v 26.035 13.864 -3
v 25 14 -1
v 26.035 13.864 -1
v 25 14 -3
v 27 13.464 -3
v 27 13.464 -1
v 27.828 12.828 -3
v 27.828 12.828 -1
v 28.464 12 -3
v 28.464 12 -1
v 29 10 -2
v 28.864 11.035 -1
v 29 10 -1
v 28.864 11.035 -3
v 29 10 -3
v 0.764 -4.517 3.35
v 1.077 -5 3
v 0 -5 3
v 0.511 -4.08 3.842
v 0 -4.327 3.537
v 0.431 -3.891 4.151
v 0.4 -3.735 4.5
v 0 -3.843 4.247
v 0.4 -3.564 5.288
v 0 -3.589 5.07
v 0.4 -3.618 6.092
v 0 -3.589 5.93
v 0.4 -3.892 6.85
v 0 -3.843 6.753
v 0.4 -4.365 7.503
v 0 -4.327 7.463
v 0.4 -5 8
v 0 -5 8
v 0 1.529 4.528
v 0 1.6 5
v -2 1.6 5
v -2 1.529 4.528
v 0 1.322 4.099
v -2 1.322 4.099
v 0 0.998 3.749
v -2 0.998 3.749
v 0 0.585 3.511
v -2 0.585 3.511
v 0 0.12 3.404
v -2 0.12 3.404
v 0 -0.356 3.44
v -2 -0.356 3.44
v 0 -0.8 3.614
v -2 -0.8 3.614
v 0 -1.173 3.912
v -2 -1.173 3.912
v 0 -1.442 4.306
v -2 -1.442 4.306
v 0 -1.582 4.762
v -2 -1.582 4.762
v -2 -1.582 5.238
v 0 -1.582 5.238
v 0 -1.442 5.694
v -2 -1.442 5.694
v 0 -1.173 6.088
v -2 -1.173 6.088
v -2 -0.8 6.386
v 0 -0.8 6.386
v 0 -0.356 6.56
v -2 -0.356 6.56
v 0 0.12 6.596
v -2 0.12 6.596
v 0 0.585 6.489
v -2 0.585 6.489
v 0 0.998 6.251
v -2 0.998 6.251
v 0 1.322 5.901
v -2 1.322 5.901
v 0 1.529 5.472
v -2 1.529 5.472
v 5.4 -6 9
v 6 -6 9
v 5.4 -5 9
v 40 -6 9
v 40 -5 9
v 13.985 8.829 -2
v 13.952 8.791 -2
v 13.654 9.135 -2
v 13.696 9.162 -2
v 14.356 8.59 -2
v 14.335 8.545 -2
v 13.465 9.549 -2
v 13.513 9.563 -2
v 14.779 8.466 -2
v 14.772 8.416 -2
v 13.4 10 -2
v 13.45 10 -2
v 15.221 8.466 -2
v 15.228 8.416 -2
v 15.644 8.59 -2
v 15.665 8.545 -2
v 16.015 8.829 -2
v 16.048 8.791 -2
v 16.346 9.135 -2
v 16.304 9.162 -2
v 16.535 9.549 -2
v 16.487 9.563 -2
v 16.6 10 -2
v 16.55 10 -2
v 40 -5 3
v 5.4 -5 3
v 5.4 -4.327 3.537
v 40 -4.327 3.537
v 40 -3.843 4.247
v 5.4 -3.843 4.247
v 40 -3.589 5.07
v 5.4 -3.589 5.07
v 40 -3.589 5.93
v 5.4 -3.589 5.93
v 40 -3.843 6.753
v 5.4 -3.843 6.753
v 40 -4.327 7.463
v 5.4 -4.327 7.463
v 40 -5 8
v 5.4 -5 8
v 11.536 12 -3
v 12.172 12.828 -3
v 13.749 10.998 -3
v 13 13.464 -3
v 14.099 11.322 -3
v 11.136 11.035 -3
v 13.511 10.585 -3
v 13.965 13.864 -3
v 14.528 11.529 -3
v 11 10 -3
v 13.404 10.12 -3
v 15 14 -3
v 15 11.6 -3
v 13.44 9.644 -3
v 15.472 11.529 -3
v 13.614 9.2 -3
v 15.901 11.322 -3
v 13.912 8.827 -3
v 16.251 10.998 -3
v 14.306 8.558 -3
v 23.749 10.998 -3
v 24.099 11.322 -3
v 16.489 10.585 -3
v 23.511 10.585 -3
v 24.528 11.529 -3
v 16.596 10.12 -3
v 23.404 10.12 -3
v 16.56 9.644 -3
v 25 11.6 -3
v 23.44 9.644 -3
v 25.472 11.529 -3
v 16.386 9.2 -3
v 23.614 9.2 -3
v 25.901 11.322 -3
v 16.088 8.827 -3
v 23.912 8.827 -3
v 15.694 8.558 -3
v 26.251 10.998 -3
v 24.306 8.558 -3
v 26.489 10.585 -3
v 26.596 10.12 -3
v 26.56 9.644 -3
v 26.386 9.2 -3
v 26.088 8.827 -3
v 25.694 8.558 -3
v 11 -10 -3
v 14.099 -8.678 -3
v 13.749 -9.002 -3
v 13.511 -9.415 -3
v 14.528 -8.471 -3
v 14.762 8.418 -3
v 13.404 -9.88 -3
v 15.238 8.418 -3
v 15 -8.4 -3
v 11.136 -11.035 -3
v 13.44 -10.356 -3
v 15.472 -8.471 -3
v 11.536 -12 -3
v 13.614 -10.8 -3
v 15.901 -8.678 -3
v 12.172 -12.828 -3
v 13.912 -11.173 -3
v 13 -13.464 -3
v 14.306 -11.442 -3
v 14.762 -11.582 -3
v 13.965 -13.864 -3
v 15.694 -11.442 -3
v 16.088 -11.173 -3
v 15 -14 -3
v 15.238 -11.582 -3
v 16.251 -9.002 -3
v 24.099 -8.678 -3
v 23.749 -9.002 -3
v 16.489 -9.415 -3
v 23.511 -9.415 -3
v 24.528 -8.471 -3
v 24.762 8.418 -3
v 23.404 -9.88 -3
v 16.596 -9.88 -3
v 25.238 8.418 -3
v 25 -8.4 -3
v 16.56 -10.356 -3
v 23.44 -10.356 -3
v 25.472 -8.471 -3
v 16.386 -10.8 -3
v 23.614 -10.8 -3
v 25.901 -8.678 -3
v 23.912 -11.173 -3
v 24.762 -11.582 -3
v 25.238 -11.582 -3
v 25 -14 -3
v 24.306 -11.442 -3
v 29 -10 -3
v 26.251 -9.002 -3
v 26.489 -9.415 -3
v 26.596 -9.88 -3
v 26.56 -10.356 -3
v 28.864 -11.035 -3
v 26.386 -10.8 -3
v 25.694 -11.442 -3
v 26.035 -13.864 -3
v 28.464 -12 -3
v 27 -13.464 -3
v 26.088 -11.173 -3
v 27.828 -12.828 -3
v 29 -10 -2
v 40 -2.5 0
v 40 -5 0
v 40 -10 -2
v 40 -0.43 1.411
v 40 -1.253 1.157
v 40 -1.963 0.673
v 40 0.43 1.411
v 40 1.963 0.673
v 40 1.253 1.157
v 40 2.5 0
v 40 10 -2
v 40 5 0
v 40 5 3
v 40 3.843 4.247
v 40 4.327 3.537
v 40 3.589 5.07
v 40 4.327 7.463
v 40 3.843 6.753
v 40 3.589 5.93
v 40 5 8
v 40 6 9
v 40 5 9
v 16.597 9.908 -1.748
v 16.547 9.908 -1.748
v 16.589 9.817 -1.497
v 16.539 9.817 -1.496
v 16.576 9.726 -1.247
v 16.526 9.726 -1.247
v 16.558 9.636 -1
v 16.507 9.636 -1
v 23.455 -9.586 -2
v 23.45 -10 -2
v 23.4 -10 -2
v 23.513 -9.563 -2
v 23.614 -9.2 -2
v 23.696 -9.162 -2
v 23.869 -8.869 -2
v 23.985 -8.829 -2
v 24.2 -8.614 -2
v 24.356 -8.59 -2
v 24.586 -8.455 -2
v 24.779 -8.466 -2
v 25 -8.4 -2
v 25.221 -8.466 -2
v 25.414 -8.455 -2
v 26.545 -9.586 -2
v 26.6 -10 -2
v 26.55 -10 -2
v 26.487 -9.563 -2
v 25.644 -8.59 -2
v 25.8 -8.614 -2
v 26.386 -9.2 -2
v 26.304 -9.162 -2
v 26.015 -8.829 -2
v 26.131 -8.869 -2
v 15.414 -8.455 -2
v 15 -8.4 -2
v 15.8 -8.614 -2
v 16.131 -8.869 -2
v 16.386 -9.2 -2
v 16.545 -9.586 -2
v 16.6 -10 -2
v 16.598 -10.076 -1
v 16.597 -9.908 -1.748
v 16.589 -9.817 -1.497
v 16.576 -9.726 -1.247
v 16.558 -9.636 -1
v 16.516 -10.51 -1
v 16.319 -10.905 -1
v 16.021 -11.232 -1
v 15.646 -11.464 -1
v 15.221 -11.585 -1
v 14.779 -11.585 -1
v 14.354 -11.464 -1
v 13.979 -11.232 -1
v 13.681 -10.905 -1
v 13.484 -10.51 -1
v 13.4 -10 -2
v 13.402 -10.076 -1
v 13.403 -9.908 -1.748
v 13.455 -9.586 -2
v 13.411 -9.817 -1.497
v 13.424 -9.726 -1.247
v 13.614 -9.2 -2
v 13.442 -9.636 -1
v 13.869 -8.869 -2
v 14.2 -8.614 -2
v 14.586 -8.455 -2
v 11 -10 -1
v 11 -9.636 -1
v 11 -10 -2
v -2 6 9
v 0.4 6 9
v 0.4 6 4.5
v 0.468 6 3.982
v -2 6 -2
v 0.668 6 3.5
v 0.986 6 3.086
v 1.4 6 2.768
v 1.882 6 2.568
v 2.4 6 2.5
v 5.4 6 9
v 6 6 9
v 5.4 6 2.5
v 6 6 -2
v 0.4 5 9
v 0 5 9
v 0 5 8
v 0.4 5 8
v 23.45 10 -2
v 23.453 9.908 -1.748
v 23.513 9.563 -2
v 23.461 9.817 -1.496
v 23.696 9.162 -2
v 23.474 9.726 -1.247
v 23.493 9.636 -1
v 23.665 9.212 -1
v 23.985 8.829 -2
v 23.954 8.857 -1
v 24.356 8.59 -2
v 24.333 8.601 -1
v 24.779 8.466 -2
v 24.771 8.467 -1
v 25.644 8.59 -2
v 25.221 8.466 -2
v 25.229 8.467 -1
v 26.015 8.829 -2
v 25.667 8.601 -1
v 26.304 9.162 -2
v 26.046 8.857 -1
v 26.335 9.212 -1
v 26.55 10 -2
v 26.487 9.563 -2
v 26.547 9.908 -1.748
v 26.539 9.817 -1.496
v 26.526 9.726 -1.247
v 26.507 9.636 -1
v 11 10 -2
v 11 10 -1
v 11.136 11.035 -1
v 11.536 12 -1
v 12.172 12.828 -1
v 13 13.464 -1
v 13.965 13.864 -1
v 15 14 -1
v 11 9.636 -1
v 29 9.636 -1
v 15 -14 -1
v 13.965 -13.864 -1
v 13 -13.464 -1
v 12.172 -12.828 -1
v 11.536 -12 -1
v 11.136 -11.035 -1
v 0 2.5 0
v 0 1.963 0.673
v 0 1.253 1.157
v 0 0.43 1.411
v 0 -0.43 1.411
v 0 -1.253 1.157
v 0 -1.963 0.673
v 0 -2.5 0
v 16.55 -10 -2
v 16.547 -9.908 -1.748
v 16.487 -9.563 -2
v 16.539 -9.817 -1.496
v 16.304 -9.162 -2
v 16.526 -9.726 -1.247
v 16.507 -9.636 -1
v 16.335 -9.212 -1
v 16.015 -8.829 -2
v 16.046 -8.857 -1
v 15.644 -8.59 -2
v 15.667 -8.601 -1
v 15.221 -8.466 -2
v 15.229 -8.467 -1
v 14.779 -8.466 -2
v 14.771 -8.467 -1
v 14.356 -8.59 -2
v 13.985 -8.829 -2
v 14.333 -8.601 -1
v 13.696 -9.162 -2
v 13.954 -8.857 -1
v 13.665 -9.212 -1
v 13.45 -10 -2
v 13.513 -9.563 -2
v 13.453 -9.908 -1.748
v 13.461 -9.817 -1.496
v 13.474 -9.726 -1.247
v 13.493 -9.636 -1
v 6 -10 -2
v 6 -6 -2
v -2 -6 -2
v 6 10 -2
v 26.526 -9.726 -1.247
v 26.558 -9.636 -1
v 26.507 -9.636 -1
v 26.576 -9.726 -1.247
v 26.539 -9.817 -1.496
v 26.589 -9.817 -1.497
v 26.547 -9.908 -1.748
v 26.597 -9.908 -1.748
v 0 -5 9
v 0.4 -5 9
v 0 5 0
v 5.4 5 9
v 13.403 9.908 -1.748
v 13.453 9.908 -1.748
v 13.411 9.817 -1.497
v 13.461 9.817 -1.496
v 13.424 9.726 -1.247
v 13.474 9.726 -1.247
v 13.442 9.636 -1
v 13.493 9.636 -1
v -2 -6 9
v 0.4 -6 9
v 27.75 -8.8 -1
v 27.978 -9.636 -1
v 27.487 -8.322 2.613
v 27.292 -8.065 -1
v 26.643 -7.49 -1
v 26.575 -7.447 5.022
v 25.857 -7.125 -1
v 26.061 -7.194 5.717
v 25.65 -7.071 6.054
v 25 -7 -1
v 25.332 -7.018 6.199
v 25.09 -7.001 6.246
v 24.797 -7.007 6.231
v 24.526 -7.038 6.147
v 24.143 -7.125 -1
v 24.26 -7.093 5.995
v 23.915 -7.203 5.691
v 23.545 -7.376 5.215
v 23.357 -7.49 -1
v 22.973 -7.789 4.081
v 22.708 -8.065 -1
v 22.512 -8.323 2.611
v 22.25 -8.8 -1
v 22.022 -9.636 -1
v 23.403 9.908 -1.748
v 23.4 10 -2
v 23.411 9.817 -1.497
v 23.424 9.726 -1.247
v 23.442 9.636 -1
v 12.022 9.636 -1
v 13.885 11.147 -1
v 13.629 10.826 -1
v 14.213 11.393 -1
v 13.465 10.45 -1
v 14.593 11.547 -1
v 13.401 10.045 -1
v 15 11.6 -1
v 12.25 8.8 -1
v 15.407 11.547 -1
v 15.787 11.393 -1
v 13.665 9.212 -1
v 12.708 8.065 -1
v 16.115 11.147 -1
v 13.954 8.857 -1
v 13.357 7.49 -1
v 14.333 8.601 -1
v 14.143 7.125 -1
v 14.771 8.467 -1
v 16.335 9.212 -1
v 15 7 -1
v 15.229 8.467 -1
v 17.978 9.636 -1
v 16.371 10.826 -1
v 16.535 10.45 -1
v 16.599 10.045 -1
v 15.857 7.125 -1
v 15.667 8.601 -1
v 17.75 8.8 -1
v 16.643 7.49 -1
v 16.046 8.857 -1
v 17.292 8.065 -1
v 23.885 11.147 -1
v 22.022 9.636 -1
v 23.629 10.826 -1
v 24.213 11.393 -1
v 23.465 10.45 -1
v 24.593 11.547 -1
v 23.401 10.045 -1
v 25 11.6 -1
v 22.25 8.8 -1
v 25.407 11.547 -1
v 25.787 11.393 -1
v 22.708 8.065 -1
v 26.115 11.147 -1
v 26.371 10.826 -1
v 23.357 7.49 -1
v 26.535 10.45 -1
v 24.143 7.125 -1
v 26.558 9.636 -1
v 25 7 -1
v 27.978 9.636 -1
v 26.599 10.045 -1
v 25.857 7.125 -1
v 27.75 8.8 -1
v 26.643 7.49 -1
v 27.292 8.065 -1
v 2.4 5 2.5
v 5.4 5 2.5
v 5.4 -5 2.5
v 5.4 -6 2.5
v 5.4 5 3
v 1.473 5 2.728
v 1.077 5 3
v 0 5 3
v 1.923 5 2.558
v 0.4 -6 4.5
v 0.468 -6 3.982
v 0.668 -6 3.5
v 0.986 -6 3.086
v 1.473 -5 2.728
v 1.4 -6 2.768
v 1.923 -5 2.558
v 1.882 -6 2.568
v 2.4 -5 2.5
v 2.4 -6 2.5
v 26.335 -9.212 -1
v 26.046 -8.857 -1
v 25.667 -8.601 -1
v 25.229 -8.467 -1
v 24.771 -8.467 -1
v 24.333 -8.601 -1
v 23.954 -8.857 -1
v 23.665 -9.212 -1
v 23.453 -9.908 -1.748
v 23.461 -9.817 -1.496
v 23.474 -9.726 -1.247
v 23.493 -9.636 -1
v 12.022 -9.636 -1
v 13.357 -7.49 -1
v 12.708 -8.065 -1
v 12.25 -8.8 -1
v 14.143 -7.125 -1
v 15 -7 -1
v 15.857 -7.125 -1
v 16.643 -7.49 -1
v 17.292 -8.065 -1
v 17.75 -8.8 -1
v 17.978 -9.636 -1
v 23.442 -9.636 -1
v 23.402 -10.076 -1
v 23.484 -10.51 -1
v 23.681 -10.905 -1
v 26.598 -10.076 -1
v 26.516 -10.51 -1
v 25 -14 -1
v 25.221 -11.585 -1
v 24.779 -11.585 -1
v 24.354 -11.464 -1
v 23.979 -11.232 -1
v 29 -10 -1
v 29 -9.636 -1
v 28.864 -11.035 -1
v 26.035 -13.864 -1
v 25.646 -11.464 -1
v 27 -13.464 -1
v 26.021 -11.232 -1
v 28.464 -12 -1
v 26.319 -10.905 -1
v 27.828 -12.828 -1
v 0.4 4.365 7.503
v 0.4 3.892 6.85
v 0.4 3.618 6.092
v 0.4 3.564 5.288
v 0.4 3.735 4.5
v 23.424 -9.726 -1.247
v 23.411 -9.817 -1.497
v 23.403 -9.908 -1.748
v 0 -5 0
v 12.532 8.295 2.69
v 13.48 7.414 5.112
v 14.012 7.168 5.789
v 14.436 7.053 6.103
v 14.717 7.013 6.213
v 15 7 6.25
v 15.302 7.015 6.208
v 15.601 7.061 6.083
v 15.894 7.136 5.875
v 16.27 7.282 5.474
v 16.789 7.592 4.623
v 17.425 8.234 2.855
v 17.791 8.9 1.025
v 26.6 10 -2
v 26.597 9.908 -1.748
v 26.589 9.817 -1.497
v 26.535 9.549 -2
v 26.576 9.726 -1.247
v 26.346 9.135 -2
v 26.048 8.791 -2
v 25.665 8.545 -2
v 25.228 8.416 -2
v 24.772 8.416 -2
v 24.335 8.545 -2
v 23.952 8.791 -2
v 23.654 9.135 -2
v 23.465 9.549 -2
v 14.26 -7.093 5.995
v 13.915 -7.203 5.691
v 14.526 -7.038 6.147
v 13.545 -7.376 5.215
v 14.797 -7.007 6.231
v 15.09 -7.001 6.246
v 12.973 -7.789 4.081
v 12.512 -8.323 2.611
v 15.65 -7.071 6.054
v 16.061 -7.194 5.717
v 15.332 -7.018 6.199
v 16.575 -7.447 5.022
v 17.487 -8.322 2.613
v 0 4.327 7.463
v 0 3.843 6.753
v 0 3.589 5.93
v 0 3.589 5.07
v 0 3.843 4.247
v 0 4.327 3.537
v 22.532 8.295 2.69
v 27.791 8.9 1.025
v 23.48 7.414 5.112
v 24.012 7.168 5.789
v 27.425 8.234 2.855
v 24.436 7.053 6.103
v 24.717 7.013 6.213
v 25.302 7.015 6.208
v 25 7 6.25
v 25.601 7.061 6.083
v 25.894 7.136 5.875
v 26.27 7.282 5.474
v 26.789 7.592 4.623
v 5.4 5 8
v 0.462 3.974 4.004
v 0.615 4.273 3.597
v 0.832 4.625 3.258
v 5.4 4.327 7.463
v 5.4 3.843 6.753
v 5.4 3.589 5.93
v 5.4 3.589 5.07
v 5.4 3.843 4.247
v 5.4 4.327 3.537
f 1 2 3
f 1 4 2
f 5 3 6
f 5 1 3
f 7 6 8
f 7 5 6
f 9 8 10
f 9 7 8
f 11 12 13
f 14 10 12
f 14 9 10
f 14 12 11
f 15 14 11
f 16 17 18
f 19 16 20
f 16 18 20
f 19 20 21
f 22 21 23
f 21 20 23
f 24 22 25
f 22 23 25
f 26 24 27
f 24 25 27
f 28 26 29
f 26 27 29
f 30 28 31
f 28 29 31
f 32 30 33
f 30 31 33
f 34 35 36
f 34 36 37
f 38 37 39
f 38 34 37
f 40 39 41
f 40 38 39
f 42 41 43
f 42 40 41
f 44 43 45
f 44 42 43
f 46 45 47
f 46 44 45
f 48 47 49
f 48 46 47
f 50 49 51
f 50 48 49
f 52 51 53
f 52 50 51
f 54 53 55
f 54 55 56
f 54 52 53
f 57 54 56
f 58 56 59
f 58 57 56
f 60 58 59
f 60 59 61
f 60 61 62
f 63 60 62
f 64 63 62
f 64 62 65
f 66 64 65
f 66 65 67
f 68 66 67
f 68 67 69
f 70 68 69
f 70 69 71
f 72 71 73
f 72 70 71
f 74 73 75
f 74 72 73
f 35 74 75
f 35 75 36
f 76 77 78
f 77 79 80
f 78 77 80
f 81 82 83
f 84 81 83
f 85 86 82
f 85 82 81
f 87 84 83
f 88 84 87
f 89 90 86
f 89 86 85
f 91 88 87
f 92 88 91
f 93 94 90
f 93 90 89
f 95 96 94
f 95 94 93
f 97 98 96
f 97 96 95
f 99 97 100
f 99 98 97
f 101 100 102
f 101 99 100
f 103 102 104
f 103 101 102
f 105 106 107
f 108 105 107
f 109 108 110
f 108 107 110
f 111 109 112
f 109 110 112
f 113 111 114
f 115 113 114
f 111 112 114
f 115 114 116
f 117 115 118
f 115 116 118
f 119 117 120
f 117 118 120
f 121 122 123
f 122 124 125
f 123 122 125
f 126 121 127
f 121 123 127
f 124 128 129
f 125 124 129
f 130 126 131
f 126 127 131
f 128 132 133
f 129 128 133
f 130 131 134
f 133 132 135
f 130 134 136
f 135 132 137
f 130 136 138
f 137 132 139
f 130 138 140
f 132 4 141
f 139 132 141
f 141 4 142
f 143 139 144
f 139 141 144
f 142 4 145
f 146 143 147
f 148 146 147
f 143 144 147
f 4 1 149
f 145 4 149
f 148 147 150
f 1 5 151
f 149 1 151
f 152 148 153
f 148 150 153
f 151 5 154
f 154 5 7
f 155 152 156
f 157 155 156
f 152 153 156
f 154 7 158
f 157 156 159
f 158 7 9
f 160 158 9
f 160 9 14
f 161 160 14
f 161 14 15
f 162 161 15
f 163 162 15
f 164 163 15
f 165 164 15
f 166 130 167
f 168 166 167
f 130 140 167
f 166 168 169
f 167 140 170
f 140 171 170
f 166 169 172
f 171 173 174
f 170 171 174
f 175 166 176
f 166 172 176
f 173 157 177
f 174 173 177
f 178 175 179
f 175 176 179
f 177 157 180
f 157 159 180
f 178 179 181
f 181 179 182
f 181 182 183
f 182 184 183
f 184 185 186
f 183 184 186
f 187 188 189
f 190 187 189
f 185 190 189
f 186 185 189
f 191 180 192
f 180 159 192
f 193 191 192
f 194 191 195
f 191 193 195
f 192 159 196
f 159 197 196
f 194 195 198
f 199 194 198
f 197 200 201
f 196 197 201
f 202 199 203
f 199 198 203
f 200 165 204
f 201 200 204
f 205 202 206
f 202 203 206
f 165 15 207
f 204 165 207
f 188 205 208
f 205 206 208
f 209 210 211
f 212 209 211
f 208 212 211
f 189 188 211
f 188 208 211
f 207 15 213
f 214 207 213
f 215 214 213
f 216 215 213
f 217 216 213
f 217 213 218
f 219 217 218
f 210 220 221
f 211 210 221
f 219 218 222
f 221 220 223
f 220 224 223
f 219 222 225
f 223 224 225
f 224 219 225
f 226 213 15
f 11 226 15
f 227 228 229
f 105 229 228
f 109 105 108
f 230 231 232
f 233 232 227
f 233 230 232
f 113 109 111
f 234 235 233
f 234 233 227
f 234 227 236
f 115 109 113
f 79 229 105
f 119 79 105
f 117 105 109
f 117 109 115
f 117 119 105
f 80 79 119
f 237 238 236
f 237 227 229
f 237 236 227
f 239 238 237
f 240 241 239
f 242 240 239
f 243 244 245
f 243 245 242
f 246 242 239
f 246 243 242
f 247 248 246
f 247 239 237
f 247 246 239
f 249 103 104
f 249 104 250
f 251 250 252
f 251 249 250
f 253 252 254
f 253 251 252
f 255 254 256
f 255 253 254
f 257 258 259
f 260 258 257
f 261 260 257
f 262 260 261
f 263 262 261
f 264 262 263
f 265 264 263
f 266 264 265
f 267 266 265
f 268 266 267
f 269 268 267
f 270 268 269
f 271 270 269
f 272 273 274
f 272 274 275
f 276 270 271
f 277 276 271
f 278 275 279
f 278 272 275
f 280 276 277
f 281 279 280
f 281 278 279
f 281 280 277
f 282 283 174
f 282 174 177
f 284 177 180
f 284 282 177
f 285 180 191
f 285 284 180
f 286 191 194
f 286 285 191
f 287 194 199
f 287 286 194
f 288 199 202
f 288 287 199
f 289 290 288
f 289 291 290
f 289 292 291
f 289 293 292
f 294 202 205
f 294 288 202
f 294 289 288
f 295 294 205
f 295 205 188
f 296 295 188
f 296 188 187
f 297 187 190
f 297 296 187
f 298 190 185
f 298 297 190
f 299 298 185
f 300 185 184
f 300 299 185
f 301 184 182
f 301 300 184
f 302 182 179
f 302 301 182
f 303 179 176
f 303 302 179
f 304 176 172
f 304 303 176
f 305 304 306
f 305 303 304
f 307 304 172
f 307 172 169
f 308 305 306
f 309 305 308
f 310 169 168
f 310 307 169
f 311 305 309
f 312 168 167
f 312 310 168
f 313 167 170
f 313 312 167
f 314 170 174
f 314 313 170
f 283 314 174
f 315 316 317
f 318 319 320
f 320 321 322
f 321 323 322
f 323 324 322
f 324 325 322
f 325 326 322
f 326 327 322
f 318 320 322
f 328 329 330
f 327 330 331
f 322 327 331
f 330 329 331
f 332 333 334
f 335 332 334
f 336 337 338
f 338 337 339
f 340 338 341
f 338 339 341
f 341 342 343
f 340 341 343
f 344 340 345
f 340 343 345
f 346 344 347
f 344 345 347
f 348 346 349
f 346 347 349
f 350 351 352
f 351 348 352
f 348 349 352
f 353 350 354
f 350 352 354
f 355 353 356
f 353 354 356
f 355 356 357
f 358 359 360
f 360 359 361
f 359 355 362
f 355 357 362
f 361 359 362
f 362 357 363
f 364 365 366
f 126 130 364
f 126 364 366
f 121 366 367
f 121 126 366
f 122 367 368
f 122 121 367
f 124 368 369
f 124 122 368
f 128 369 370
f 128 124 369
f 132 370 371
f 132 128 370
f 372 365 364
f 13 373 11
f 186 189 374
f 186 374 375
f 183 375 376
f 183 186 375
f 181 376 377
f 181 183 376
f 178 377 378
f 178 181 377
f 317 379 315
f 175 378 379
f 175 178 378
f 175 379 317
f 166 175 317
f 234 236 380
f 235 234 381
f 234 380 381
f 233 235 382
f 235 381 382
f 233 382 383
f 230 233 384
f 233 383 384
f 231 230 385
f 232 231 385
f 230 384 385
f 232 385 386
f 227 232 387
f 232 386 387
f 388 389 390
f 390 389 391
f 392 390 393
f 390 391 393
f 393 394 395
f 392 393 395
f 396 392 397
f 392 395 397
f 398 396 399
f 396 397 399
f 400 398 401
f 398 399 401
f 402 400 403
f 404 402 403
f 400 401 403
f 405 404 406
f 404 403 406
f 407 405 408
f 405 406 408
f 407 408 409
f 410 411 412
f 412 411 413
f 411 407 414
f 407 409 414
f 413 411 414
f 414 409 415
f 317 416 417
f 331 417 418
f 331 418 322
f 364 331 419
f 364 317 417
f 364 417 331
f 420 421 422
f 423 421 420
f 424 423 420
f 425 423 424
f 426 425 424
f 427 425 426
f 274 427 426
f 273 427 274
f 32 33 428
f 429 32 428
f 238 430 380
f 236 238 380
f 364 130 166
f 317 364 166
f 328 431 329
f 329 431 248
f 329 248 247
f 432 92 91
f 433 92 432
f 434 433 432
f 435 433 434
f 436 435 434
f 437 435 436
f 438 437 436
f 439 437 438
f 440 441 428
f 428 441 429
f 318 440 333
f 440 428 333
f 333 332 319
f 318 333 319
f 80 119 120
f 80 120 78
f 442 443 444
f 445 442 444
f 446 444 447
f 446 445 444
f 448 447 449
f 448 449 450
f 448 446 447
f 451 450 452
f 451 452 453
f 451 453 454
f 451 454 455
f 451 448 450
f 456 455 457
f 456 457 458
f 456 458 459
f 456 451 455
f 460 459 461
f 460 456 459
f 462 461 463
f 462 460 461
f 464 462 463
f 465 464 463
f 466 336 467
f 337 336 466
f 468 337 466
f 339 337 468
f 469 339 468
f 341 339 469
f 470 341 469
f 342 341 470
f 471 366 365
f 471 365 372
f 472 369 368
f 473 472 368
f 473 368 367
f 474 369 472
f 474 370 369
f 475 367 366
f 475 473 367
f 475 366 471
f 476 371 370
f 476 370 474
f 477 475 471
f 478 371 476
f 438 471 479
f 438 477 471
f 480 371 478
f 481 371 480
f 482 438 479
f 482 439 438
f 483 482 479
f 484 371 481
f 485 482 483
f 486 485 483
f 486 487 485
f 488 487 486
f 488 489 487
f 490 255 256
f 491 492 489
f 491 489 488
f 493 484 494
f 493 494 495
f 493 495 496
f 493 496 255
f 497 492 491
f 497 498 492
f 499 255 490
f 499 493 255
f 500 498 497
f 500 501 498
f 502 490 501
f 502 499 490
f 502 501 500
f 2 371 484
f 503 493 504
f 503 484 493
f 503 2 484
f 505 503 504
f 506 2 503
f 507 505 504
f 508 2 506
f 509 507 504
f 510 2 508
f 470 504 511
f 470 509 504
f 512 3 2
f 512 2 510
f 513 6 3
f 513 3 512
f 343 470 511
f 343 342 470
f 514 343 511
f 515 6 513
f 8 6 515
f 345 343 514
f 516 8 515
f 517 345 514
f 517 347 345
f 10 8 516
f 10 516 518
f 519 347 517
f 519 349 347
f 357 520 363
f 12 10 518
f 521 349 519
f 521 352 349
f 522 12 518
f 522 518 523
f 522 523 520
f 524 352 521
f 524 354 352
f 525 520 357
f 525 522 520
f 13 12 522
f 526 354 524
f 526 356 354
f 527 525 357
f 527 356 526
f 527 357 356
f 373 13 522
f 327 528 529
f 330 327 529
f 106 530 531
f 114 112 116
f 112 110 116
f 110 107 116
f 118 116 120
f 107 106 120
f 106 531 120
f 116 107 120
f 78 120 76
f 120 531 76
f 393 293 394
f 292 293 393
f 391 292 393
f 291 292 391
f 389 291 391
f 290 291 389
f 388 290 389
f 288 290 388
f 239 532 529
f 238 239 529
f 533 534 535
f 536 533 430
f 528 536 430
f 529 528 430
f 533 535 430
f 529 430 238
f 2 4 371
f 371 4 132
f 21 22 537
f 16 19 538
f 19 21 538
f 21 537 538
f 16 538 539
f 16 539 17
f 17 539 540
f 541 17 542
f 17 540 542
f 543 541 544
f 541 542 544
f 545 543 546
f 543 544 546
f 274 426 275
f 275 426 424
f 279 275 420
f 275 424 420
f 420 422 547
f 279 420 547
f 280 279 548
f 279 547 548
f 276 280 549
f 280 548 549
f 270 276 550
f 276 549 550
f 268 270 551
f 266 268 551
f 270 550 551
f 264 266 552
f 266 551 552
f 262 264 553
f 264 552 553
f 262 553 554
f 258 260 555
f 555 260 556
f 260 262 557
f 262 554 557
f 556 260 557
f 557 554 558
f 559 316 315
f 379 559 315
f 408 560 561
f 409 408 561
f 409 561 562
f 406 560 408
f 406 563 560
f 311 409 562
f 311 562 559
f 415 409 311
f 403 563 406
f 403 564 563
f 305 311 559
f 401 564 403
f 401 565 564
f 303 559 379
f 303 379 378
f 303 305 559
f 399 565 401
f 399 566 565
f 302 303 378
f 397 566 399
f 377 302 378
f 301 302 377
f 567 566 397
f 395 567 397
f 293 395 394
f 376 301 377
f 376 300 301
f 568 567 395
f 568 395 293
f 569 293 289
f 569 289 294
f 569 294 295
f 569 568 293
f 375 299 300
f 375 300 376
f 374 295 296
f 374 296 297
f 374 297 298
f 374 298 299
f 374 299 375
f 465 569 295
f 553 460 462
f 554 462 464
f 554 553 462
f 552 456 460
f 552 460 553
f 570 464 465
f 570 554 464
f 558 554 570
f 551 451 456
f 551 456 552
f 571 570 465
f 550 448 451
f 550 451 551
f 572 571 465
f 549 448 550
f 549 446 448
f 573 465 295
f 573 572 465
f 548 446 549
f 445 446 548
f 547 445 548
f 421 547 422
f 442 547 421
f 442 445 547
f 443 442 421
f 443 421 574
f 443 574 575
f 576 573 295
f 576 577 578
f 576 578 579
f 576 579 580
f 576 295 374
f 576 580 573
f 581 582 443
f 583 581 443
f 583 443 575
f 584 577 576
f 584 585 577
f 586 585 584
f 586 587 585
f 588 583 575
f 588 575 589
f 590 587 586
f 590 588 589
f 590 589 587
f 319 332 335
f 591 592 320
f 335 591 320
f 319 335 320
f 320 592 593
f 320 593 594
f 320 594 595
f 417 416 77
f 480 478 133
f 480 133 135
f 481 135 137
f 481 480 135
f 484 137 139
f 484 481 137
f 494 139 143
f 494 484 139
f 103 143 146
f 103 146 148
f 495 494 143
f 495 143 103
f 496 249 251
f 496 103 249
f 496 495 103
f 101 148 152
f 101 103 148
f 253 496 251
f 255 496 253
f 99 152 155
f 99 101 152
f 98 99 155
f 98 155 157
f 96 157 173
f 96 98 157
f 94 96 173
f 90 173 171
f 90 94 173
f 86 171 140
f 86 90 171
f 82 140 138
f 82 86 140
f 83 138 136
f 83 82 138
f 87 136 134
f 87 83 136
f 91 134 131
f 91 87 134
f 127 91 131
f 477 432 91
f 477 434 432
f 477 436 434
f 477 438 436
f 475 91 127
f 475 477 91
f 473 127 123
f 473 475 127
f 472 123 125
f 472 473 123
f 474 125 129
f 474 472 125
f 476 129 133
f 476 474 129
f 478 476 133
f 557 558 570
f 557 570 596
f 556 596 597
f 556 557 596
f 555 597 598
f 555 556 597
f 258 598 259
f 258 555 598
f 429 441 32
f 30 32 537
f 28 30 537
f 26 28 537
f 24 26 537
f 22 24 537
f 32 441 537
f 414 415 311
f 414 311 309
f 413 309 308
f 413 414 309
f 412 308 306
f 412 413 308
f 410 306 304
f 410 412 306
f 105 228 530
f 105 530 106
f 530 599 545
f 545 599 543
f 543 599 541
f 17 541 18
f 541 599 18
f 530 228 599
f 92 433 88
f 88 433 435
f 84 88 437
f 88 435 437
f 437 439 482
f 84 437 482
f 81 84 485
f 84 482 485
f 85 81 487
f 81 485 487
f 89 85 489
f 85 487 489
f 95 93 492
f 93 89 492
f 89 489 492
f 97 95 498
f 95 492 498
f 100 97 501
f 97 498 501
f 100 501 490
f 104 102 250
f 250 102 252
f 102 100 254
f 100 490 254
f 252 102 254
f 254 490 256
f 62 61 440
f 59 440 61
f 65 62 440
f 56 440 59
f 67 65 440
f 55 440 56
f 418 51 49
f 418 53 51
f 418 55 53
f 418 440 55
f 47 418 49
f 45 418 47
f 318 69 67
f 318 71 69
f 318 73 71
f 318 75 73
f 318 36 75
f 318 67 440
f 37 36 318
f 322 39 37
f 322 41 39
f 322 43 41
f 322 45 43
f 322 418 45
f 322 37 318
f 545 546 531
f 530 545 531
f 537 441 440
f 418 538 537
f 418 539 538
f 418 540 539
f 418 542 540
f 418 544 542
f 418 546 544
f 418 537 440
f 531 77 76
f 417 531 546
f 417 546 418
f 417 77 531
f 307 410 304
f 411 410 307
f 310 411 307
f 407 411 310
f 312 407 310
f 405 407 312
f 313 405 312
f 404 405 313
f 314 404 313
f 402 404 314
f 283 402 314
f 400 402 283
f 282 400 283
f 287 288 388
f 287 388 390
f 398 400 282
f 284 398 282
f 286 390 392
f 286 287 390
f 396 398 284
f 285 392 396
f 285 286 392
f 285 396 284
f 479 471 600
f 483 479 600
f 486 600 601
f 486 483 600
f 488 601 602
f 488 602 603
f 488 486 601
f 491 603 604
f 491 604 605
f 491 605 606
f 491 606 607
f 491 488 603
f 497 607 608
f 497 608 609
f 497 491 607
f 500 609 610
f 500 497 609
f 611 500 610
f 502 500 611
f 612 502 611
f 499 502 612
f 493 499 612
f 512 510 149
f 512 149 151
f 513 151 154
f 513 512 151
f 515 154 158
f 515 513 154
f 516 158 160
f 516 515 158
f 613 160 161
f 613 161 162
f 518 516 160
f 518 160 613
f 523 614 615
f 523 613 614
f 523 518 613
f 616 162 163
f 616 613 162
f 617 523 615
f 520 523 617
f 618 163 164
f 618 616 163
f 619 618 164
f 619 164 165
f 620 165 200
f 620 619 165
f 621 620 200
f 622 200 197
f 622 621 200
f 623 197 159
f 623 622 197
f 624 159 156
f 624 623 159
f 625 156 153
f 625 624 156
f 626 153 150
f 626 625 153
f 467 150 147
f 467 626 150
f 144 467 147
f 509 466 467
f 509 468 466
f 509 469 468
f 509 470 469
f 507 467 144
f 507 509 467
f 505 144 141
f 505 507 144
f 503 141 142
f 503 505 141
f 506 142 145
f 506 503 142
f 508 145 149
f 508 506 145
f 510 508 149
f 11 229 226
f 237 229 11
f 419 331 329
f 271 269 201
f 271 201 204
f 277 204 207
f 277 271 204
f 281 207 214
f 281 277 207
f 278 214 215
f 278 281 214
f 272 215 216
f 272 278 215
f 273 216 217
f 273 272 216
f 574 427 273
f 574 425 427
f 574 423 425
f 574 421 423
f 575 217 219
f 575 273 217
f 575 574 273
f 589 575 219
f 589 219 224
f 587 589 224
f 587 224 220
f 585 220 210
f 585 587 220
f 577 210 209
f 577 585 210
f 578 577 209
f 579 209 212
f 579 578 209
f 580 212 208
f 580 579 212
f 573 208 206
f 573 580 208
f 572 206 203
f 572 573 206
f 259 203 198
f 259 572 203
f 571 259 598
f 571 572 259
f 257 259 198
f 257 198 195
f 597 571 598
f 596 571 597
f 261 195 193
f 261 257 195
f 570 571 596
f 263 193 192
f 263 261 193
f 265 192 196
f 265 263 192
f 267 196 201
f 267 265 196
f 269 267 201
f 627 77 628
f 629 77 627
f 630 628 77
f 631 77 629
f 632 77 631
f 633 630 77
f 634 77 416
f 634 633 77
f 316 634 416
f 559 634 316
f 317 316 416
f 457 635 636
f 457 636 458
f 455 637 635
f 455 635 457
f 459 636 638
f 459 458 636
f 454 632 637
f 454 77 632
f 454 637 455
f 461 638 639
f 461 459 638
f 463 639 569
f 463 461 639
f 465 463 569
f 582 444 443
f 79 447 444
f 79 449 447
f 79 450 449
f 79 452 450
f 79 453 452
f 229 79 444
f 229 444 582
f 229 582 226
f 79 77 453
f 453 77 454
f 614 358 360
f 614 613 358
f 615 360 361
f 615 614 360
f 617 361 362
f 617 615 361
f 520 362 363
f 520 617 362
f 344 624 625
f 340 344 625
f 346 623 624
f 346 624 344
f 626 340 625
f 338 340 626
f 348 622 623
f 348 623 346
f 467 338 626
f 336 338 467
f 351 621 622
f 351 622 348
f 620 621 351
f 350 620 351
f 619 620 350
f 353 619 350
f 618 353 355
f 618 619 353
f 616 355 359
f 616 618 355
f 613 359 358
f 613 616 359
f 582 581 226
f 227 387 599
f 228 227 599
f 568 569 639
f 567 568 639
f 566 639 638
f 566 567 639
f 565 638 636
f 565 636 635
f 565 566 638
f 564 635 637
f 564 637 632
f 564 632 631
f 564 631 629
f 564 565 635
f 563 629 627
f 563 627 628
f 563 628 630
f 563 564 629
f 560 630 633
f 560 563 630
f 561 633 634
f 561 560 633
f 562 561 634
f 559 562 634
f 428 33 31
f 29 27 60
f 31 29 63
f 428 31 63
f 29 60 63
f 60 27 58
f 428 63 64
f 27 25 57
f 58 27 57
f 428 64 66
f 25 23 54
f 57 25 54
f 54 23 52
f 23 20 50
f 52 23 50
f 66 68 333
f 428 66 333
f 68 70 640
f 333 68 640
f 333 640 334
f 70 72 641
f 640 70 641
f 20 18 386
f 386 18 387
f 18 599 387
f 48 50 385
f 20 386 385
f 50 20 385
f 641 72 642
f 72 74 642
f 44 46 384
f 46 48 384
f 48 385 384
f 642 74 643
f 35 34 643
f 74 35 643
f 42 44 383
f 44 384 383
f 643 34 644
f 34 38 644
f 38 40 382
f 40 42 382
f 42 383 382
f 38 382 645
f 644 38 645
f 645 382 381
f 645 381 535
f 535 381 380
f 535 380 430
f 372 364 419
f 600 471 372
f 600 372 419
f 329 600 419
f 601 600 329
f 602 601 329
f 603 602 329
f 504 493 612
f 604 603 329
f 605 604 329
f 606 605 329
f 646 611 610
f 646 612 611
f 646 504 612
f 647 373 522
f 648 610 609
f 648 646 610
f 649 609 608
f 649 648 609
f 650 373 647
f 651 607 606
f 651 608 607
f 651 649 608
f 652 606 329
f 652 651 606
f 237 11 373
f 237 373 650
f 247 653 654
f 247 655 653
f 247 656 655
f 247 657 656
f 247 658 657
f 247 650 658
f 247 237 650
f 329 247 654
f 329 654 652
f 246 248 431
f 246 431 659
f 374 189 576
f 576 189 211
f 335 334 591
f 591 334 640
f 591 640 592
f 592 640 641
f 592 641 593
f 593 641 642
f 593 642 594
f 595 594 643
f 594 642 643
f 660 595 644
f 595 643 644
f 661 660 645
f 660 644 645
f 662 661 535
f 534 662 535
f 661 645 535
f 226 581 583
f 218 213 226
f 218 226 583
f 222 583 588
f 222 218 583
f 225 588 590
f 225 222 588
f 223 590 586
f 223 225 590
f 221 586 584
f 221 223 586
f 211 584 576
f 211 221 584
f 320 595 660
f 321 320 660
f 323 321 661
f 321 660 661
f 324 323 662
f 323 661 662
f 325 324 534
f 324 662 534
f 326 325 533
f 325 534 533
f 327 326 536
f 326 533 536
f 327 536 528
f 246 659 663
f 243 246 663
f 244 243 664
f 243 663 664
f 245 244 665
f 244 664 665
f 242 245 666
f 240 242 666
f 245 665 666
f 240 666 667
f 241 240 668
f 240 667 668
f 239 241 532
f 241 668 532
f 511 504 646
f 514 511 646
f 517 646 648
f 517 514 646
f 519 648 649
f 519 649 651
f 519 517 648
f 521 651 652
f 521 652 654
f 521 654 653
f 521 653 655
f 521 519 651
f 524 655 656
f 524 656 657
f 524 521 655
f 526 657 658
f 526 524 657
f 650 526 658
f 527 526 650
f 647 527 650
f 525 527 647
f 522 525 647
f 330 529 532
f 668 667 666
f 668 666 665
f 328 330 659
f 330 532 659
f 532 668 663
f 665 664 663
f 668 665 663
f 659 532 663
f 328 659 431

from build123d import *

# Parameters (mm, degrees)
PAD_DEPTH       = 40
SKETCH001_W     = 12
SKETCH001_H     = 11
SKETCH001_R     = 1.6
PAD001_DEPTH    = 2
SKETCH002_R     = 1.6
PAD002_DEPTH    = 1
POCKET_DEPTH    = 20.001
PAD003_DEPTH    = 34
SKETCH005_R     = 3
POCKET001_DEPTH = 11
SKETCH006_R     = 1.55
POCKET002_DEPTH = 5


with BuildPart() as part:
    # Sketch → Pad (new body)
    with BuildSketch(Plane.YZ):
        with BuildLine():
            Line((-5, 8), (-5, 9))
            Line((-5, 9), (-6, 9))
            Line((-6, 9), (-6, -2))
            Line((-6, -2), (6, -2))
            Line((6, -2), (6, 9))
            Line((6, 9), (5, 9))
            Line((5, 9), (5, 8))
            ThreePointArc((5, 8), (3.556624, 5.5), (5, 3))
            Line((5, 3), (5, 0))
            Line((5, 0), (2.5, 0))
            ThreePointArc((2.5, 0), (0, 1.443376), (-2.5, 0))
            Line((-2.5, 0), (-5, 0))
            Line((-5, 0), (-5, 3))
            ThreePointArc((-5, 3), (-3.556624, 5.5), (-5, 8))
        make_face()
    extrude(amount=PAD_DEPTH)

    # Sketch001 (on Face15 of Pad) → Pad001 (join)
    with BuildSketch(Plane(origin=(0, 0, 0), x_dir=(0, 1, 0), z_dir=(-1, 0, 0))):
        with Locations((0, -3.5)):
            Rectangle(SKETCH001_W, SKETCH001_H)
        with Locations((0, -5)):
            Circle(SKETCH001_R, mode=Mode.SUBTRACT)
    extrude(amount=PAD001_DEPTH)

    # Sketch002 (on Face16 of Pad001) → Pad002 (join, symmetric)
    with BuildSketch(Plane.YX.offset(2)):
        with BuildLine():
            Line((-10, 29), (10, 29))
            ThreePointArc((14, 25), (12.828427, 27.828427), (10, 29))
            Line((14, 25), (14, 15))
            ThreePointArc((10, 11), (12.828427, 12.171573), (14, 15))
            Line((10, 11), (-10, 11))
            ThreePointArc((-14, 15), (-12.828427, 12.171573), (-10, 11))
            Line((-14, 15), (-14, 25))
            ThreePointArc((-10, 29), (-12.828427, 27.828427), (-14, 25))
        make_face()
        with Locations((-10, 25)):
            Circle(SKETCH002_R, mode=Mode.SUBTRACT)
        with Locations((-10, 15)):
            Circle(SKETCH002_R, mode=Mode.SUBTRACT)
        with Locations((10, 15)):
            Circle(SKETCH002_R, mode=Mode.SUBTRACT)
        with Locations((10, 25)):
            Circle(SKETCH002_R, mode=Mode.SUBTRACT)
    extrude(amount=PAD002_DEPTH, both=True)

    # Sketch003 (on Face7 of Pad002) → Pocket (cut, through all)
    with BuildSketch(Plane(origin=(0, -6, 0), x_dir=(0, 0, -1), z_dir=(0, -1, 0))):
        with BuildLine():
            Line((-9, 0.4), (-4.5, 0.4))
            ThreePointArc((-4.5, 0.4), (-3.085786, 0.985786), (-2.5, 2.4))
            Line((-2.5, 2.4), (-2.5, 5.4))
            Line((-2.5, 5.4), (-9, 5.4))
            Line((-9, 5.4), (-9, 0.4))
        make_face()
    extrude(amount=-POCKET_DEPTH, mode=Mode.SUBTRACT)

    # Sketch004 (on Face23 of Pocket) → Pad003 (join)
    with BuildSketch(Plane.YZ.offset(40)):
        Polygon((-6, 9), (-10, -2), (10, -2), (6, 9), (6, -1), (-6, -1), align=None)
    extrude(amount=-PAD003_DEPTH)

    # Sketch005 (on Face52 of Pad003) → Pocket001 (cut)
    with BuildSketch(Plane(origin=(0, 0, -1), x_dir=(0, -1, 0), z_dir=(0, 0, 1))):
        with Locations((-10, 25)):
            Circle(SKETCH005_R)
        with Locations((10, 25)):
            Circle(SKETCH005_R)
        with Locations((10, 15)):
            Circle(SKETCH005_R)
        with Locations((-10, 15)):
            Circle(SKETCH005_R)
    extrude(amount=POCKET001_DEPTH, mode=Mode.SUBTRACT)

    # Sketch006 (on Face52 of Pocket001) → Pocket002 (cut)
    with BuildSketch(Plane(origin=(0, 0, -1), x_dir=(0, -1, 0), z_dir=(0, 0, 1))):
        with Locations((-10, 25)):
            Circle(SKETCH006_R)
        with Locations((-10, 15)):
            Circle(SKETCH006_R)
        with Locations((10, 25)):
            Circle(SKETCH006_R)
        with Locations((10, 15)):
            Circle(SKETCH006_R)
    extrude(amount=-POCKET002_DEPTH, mode=Mode.SUBTRACT)


solid = part.part
